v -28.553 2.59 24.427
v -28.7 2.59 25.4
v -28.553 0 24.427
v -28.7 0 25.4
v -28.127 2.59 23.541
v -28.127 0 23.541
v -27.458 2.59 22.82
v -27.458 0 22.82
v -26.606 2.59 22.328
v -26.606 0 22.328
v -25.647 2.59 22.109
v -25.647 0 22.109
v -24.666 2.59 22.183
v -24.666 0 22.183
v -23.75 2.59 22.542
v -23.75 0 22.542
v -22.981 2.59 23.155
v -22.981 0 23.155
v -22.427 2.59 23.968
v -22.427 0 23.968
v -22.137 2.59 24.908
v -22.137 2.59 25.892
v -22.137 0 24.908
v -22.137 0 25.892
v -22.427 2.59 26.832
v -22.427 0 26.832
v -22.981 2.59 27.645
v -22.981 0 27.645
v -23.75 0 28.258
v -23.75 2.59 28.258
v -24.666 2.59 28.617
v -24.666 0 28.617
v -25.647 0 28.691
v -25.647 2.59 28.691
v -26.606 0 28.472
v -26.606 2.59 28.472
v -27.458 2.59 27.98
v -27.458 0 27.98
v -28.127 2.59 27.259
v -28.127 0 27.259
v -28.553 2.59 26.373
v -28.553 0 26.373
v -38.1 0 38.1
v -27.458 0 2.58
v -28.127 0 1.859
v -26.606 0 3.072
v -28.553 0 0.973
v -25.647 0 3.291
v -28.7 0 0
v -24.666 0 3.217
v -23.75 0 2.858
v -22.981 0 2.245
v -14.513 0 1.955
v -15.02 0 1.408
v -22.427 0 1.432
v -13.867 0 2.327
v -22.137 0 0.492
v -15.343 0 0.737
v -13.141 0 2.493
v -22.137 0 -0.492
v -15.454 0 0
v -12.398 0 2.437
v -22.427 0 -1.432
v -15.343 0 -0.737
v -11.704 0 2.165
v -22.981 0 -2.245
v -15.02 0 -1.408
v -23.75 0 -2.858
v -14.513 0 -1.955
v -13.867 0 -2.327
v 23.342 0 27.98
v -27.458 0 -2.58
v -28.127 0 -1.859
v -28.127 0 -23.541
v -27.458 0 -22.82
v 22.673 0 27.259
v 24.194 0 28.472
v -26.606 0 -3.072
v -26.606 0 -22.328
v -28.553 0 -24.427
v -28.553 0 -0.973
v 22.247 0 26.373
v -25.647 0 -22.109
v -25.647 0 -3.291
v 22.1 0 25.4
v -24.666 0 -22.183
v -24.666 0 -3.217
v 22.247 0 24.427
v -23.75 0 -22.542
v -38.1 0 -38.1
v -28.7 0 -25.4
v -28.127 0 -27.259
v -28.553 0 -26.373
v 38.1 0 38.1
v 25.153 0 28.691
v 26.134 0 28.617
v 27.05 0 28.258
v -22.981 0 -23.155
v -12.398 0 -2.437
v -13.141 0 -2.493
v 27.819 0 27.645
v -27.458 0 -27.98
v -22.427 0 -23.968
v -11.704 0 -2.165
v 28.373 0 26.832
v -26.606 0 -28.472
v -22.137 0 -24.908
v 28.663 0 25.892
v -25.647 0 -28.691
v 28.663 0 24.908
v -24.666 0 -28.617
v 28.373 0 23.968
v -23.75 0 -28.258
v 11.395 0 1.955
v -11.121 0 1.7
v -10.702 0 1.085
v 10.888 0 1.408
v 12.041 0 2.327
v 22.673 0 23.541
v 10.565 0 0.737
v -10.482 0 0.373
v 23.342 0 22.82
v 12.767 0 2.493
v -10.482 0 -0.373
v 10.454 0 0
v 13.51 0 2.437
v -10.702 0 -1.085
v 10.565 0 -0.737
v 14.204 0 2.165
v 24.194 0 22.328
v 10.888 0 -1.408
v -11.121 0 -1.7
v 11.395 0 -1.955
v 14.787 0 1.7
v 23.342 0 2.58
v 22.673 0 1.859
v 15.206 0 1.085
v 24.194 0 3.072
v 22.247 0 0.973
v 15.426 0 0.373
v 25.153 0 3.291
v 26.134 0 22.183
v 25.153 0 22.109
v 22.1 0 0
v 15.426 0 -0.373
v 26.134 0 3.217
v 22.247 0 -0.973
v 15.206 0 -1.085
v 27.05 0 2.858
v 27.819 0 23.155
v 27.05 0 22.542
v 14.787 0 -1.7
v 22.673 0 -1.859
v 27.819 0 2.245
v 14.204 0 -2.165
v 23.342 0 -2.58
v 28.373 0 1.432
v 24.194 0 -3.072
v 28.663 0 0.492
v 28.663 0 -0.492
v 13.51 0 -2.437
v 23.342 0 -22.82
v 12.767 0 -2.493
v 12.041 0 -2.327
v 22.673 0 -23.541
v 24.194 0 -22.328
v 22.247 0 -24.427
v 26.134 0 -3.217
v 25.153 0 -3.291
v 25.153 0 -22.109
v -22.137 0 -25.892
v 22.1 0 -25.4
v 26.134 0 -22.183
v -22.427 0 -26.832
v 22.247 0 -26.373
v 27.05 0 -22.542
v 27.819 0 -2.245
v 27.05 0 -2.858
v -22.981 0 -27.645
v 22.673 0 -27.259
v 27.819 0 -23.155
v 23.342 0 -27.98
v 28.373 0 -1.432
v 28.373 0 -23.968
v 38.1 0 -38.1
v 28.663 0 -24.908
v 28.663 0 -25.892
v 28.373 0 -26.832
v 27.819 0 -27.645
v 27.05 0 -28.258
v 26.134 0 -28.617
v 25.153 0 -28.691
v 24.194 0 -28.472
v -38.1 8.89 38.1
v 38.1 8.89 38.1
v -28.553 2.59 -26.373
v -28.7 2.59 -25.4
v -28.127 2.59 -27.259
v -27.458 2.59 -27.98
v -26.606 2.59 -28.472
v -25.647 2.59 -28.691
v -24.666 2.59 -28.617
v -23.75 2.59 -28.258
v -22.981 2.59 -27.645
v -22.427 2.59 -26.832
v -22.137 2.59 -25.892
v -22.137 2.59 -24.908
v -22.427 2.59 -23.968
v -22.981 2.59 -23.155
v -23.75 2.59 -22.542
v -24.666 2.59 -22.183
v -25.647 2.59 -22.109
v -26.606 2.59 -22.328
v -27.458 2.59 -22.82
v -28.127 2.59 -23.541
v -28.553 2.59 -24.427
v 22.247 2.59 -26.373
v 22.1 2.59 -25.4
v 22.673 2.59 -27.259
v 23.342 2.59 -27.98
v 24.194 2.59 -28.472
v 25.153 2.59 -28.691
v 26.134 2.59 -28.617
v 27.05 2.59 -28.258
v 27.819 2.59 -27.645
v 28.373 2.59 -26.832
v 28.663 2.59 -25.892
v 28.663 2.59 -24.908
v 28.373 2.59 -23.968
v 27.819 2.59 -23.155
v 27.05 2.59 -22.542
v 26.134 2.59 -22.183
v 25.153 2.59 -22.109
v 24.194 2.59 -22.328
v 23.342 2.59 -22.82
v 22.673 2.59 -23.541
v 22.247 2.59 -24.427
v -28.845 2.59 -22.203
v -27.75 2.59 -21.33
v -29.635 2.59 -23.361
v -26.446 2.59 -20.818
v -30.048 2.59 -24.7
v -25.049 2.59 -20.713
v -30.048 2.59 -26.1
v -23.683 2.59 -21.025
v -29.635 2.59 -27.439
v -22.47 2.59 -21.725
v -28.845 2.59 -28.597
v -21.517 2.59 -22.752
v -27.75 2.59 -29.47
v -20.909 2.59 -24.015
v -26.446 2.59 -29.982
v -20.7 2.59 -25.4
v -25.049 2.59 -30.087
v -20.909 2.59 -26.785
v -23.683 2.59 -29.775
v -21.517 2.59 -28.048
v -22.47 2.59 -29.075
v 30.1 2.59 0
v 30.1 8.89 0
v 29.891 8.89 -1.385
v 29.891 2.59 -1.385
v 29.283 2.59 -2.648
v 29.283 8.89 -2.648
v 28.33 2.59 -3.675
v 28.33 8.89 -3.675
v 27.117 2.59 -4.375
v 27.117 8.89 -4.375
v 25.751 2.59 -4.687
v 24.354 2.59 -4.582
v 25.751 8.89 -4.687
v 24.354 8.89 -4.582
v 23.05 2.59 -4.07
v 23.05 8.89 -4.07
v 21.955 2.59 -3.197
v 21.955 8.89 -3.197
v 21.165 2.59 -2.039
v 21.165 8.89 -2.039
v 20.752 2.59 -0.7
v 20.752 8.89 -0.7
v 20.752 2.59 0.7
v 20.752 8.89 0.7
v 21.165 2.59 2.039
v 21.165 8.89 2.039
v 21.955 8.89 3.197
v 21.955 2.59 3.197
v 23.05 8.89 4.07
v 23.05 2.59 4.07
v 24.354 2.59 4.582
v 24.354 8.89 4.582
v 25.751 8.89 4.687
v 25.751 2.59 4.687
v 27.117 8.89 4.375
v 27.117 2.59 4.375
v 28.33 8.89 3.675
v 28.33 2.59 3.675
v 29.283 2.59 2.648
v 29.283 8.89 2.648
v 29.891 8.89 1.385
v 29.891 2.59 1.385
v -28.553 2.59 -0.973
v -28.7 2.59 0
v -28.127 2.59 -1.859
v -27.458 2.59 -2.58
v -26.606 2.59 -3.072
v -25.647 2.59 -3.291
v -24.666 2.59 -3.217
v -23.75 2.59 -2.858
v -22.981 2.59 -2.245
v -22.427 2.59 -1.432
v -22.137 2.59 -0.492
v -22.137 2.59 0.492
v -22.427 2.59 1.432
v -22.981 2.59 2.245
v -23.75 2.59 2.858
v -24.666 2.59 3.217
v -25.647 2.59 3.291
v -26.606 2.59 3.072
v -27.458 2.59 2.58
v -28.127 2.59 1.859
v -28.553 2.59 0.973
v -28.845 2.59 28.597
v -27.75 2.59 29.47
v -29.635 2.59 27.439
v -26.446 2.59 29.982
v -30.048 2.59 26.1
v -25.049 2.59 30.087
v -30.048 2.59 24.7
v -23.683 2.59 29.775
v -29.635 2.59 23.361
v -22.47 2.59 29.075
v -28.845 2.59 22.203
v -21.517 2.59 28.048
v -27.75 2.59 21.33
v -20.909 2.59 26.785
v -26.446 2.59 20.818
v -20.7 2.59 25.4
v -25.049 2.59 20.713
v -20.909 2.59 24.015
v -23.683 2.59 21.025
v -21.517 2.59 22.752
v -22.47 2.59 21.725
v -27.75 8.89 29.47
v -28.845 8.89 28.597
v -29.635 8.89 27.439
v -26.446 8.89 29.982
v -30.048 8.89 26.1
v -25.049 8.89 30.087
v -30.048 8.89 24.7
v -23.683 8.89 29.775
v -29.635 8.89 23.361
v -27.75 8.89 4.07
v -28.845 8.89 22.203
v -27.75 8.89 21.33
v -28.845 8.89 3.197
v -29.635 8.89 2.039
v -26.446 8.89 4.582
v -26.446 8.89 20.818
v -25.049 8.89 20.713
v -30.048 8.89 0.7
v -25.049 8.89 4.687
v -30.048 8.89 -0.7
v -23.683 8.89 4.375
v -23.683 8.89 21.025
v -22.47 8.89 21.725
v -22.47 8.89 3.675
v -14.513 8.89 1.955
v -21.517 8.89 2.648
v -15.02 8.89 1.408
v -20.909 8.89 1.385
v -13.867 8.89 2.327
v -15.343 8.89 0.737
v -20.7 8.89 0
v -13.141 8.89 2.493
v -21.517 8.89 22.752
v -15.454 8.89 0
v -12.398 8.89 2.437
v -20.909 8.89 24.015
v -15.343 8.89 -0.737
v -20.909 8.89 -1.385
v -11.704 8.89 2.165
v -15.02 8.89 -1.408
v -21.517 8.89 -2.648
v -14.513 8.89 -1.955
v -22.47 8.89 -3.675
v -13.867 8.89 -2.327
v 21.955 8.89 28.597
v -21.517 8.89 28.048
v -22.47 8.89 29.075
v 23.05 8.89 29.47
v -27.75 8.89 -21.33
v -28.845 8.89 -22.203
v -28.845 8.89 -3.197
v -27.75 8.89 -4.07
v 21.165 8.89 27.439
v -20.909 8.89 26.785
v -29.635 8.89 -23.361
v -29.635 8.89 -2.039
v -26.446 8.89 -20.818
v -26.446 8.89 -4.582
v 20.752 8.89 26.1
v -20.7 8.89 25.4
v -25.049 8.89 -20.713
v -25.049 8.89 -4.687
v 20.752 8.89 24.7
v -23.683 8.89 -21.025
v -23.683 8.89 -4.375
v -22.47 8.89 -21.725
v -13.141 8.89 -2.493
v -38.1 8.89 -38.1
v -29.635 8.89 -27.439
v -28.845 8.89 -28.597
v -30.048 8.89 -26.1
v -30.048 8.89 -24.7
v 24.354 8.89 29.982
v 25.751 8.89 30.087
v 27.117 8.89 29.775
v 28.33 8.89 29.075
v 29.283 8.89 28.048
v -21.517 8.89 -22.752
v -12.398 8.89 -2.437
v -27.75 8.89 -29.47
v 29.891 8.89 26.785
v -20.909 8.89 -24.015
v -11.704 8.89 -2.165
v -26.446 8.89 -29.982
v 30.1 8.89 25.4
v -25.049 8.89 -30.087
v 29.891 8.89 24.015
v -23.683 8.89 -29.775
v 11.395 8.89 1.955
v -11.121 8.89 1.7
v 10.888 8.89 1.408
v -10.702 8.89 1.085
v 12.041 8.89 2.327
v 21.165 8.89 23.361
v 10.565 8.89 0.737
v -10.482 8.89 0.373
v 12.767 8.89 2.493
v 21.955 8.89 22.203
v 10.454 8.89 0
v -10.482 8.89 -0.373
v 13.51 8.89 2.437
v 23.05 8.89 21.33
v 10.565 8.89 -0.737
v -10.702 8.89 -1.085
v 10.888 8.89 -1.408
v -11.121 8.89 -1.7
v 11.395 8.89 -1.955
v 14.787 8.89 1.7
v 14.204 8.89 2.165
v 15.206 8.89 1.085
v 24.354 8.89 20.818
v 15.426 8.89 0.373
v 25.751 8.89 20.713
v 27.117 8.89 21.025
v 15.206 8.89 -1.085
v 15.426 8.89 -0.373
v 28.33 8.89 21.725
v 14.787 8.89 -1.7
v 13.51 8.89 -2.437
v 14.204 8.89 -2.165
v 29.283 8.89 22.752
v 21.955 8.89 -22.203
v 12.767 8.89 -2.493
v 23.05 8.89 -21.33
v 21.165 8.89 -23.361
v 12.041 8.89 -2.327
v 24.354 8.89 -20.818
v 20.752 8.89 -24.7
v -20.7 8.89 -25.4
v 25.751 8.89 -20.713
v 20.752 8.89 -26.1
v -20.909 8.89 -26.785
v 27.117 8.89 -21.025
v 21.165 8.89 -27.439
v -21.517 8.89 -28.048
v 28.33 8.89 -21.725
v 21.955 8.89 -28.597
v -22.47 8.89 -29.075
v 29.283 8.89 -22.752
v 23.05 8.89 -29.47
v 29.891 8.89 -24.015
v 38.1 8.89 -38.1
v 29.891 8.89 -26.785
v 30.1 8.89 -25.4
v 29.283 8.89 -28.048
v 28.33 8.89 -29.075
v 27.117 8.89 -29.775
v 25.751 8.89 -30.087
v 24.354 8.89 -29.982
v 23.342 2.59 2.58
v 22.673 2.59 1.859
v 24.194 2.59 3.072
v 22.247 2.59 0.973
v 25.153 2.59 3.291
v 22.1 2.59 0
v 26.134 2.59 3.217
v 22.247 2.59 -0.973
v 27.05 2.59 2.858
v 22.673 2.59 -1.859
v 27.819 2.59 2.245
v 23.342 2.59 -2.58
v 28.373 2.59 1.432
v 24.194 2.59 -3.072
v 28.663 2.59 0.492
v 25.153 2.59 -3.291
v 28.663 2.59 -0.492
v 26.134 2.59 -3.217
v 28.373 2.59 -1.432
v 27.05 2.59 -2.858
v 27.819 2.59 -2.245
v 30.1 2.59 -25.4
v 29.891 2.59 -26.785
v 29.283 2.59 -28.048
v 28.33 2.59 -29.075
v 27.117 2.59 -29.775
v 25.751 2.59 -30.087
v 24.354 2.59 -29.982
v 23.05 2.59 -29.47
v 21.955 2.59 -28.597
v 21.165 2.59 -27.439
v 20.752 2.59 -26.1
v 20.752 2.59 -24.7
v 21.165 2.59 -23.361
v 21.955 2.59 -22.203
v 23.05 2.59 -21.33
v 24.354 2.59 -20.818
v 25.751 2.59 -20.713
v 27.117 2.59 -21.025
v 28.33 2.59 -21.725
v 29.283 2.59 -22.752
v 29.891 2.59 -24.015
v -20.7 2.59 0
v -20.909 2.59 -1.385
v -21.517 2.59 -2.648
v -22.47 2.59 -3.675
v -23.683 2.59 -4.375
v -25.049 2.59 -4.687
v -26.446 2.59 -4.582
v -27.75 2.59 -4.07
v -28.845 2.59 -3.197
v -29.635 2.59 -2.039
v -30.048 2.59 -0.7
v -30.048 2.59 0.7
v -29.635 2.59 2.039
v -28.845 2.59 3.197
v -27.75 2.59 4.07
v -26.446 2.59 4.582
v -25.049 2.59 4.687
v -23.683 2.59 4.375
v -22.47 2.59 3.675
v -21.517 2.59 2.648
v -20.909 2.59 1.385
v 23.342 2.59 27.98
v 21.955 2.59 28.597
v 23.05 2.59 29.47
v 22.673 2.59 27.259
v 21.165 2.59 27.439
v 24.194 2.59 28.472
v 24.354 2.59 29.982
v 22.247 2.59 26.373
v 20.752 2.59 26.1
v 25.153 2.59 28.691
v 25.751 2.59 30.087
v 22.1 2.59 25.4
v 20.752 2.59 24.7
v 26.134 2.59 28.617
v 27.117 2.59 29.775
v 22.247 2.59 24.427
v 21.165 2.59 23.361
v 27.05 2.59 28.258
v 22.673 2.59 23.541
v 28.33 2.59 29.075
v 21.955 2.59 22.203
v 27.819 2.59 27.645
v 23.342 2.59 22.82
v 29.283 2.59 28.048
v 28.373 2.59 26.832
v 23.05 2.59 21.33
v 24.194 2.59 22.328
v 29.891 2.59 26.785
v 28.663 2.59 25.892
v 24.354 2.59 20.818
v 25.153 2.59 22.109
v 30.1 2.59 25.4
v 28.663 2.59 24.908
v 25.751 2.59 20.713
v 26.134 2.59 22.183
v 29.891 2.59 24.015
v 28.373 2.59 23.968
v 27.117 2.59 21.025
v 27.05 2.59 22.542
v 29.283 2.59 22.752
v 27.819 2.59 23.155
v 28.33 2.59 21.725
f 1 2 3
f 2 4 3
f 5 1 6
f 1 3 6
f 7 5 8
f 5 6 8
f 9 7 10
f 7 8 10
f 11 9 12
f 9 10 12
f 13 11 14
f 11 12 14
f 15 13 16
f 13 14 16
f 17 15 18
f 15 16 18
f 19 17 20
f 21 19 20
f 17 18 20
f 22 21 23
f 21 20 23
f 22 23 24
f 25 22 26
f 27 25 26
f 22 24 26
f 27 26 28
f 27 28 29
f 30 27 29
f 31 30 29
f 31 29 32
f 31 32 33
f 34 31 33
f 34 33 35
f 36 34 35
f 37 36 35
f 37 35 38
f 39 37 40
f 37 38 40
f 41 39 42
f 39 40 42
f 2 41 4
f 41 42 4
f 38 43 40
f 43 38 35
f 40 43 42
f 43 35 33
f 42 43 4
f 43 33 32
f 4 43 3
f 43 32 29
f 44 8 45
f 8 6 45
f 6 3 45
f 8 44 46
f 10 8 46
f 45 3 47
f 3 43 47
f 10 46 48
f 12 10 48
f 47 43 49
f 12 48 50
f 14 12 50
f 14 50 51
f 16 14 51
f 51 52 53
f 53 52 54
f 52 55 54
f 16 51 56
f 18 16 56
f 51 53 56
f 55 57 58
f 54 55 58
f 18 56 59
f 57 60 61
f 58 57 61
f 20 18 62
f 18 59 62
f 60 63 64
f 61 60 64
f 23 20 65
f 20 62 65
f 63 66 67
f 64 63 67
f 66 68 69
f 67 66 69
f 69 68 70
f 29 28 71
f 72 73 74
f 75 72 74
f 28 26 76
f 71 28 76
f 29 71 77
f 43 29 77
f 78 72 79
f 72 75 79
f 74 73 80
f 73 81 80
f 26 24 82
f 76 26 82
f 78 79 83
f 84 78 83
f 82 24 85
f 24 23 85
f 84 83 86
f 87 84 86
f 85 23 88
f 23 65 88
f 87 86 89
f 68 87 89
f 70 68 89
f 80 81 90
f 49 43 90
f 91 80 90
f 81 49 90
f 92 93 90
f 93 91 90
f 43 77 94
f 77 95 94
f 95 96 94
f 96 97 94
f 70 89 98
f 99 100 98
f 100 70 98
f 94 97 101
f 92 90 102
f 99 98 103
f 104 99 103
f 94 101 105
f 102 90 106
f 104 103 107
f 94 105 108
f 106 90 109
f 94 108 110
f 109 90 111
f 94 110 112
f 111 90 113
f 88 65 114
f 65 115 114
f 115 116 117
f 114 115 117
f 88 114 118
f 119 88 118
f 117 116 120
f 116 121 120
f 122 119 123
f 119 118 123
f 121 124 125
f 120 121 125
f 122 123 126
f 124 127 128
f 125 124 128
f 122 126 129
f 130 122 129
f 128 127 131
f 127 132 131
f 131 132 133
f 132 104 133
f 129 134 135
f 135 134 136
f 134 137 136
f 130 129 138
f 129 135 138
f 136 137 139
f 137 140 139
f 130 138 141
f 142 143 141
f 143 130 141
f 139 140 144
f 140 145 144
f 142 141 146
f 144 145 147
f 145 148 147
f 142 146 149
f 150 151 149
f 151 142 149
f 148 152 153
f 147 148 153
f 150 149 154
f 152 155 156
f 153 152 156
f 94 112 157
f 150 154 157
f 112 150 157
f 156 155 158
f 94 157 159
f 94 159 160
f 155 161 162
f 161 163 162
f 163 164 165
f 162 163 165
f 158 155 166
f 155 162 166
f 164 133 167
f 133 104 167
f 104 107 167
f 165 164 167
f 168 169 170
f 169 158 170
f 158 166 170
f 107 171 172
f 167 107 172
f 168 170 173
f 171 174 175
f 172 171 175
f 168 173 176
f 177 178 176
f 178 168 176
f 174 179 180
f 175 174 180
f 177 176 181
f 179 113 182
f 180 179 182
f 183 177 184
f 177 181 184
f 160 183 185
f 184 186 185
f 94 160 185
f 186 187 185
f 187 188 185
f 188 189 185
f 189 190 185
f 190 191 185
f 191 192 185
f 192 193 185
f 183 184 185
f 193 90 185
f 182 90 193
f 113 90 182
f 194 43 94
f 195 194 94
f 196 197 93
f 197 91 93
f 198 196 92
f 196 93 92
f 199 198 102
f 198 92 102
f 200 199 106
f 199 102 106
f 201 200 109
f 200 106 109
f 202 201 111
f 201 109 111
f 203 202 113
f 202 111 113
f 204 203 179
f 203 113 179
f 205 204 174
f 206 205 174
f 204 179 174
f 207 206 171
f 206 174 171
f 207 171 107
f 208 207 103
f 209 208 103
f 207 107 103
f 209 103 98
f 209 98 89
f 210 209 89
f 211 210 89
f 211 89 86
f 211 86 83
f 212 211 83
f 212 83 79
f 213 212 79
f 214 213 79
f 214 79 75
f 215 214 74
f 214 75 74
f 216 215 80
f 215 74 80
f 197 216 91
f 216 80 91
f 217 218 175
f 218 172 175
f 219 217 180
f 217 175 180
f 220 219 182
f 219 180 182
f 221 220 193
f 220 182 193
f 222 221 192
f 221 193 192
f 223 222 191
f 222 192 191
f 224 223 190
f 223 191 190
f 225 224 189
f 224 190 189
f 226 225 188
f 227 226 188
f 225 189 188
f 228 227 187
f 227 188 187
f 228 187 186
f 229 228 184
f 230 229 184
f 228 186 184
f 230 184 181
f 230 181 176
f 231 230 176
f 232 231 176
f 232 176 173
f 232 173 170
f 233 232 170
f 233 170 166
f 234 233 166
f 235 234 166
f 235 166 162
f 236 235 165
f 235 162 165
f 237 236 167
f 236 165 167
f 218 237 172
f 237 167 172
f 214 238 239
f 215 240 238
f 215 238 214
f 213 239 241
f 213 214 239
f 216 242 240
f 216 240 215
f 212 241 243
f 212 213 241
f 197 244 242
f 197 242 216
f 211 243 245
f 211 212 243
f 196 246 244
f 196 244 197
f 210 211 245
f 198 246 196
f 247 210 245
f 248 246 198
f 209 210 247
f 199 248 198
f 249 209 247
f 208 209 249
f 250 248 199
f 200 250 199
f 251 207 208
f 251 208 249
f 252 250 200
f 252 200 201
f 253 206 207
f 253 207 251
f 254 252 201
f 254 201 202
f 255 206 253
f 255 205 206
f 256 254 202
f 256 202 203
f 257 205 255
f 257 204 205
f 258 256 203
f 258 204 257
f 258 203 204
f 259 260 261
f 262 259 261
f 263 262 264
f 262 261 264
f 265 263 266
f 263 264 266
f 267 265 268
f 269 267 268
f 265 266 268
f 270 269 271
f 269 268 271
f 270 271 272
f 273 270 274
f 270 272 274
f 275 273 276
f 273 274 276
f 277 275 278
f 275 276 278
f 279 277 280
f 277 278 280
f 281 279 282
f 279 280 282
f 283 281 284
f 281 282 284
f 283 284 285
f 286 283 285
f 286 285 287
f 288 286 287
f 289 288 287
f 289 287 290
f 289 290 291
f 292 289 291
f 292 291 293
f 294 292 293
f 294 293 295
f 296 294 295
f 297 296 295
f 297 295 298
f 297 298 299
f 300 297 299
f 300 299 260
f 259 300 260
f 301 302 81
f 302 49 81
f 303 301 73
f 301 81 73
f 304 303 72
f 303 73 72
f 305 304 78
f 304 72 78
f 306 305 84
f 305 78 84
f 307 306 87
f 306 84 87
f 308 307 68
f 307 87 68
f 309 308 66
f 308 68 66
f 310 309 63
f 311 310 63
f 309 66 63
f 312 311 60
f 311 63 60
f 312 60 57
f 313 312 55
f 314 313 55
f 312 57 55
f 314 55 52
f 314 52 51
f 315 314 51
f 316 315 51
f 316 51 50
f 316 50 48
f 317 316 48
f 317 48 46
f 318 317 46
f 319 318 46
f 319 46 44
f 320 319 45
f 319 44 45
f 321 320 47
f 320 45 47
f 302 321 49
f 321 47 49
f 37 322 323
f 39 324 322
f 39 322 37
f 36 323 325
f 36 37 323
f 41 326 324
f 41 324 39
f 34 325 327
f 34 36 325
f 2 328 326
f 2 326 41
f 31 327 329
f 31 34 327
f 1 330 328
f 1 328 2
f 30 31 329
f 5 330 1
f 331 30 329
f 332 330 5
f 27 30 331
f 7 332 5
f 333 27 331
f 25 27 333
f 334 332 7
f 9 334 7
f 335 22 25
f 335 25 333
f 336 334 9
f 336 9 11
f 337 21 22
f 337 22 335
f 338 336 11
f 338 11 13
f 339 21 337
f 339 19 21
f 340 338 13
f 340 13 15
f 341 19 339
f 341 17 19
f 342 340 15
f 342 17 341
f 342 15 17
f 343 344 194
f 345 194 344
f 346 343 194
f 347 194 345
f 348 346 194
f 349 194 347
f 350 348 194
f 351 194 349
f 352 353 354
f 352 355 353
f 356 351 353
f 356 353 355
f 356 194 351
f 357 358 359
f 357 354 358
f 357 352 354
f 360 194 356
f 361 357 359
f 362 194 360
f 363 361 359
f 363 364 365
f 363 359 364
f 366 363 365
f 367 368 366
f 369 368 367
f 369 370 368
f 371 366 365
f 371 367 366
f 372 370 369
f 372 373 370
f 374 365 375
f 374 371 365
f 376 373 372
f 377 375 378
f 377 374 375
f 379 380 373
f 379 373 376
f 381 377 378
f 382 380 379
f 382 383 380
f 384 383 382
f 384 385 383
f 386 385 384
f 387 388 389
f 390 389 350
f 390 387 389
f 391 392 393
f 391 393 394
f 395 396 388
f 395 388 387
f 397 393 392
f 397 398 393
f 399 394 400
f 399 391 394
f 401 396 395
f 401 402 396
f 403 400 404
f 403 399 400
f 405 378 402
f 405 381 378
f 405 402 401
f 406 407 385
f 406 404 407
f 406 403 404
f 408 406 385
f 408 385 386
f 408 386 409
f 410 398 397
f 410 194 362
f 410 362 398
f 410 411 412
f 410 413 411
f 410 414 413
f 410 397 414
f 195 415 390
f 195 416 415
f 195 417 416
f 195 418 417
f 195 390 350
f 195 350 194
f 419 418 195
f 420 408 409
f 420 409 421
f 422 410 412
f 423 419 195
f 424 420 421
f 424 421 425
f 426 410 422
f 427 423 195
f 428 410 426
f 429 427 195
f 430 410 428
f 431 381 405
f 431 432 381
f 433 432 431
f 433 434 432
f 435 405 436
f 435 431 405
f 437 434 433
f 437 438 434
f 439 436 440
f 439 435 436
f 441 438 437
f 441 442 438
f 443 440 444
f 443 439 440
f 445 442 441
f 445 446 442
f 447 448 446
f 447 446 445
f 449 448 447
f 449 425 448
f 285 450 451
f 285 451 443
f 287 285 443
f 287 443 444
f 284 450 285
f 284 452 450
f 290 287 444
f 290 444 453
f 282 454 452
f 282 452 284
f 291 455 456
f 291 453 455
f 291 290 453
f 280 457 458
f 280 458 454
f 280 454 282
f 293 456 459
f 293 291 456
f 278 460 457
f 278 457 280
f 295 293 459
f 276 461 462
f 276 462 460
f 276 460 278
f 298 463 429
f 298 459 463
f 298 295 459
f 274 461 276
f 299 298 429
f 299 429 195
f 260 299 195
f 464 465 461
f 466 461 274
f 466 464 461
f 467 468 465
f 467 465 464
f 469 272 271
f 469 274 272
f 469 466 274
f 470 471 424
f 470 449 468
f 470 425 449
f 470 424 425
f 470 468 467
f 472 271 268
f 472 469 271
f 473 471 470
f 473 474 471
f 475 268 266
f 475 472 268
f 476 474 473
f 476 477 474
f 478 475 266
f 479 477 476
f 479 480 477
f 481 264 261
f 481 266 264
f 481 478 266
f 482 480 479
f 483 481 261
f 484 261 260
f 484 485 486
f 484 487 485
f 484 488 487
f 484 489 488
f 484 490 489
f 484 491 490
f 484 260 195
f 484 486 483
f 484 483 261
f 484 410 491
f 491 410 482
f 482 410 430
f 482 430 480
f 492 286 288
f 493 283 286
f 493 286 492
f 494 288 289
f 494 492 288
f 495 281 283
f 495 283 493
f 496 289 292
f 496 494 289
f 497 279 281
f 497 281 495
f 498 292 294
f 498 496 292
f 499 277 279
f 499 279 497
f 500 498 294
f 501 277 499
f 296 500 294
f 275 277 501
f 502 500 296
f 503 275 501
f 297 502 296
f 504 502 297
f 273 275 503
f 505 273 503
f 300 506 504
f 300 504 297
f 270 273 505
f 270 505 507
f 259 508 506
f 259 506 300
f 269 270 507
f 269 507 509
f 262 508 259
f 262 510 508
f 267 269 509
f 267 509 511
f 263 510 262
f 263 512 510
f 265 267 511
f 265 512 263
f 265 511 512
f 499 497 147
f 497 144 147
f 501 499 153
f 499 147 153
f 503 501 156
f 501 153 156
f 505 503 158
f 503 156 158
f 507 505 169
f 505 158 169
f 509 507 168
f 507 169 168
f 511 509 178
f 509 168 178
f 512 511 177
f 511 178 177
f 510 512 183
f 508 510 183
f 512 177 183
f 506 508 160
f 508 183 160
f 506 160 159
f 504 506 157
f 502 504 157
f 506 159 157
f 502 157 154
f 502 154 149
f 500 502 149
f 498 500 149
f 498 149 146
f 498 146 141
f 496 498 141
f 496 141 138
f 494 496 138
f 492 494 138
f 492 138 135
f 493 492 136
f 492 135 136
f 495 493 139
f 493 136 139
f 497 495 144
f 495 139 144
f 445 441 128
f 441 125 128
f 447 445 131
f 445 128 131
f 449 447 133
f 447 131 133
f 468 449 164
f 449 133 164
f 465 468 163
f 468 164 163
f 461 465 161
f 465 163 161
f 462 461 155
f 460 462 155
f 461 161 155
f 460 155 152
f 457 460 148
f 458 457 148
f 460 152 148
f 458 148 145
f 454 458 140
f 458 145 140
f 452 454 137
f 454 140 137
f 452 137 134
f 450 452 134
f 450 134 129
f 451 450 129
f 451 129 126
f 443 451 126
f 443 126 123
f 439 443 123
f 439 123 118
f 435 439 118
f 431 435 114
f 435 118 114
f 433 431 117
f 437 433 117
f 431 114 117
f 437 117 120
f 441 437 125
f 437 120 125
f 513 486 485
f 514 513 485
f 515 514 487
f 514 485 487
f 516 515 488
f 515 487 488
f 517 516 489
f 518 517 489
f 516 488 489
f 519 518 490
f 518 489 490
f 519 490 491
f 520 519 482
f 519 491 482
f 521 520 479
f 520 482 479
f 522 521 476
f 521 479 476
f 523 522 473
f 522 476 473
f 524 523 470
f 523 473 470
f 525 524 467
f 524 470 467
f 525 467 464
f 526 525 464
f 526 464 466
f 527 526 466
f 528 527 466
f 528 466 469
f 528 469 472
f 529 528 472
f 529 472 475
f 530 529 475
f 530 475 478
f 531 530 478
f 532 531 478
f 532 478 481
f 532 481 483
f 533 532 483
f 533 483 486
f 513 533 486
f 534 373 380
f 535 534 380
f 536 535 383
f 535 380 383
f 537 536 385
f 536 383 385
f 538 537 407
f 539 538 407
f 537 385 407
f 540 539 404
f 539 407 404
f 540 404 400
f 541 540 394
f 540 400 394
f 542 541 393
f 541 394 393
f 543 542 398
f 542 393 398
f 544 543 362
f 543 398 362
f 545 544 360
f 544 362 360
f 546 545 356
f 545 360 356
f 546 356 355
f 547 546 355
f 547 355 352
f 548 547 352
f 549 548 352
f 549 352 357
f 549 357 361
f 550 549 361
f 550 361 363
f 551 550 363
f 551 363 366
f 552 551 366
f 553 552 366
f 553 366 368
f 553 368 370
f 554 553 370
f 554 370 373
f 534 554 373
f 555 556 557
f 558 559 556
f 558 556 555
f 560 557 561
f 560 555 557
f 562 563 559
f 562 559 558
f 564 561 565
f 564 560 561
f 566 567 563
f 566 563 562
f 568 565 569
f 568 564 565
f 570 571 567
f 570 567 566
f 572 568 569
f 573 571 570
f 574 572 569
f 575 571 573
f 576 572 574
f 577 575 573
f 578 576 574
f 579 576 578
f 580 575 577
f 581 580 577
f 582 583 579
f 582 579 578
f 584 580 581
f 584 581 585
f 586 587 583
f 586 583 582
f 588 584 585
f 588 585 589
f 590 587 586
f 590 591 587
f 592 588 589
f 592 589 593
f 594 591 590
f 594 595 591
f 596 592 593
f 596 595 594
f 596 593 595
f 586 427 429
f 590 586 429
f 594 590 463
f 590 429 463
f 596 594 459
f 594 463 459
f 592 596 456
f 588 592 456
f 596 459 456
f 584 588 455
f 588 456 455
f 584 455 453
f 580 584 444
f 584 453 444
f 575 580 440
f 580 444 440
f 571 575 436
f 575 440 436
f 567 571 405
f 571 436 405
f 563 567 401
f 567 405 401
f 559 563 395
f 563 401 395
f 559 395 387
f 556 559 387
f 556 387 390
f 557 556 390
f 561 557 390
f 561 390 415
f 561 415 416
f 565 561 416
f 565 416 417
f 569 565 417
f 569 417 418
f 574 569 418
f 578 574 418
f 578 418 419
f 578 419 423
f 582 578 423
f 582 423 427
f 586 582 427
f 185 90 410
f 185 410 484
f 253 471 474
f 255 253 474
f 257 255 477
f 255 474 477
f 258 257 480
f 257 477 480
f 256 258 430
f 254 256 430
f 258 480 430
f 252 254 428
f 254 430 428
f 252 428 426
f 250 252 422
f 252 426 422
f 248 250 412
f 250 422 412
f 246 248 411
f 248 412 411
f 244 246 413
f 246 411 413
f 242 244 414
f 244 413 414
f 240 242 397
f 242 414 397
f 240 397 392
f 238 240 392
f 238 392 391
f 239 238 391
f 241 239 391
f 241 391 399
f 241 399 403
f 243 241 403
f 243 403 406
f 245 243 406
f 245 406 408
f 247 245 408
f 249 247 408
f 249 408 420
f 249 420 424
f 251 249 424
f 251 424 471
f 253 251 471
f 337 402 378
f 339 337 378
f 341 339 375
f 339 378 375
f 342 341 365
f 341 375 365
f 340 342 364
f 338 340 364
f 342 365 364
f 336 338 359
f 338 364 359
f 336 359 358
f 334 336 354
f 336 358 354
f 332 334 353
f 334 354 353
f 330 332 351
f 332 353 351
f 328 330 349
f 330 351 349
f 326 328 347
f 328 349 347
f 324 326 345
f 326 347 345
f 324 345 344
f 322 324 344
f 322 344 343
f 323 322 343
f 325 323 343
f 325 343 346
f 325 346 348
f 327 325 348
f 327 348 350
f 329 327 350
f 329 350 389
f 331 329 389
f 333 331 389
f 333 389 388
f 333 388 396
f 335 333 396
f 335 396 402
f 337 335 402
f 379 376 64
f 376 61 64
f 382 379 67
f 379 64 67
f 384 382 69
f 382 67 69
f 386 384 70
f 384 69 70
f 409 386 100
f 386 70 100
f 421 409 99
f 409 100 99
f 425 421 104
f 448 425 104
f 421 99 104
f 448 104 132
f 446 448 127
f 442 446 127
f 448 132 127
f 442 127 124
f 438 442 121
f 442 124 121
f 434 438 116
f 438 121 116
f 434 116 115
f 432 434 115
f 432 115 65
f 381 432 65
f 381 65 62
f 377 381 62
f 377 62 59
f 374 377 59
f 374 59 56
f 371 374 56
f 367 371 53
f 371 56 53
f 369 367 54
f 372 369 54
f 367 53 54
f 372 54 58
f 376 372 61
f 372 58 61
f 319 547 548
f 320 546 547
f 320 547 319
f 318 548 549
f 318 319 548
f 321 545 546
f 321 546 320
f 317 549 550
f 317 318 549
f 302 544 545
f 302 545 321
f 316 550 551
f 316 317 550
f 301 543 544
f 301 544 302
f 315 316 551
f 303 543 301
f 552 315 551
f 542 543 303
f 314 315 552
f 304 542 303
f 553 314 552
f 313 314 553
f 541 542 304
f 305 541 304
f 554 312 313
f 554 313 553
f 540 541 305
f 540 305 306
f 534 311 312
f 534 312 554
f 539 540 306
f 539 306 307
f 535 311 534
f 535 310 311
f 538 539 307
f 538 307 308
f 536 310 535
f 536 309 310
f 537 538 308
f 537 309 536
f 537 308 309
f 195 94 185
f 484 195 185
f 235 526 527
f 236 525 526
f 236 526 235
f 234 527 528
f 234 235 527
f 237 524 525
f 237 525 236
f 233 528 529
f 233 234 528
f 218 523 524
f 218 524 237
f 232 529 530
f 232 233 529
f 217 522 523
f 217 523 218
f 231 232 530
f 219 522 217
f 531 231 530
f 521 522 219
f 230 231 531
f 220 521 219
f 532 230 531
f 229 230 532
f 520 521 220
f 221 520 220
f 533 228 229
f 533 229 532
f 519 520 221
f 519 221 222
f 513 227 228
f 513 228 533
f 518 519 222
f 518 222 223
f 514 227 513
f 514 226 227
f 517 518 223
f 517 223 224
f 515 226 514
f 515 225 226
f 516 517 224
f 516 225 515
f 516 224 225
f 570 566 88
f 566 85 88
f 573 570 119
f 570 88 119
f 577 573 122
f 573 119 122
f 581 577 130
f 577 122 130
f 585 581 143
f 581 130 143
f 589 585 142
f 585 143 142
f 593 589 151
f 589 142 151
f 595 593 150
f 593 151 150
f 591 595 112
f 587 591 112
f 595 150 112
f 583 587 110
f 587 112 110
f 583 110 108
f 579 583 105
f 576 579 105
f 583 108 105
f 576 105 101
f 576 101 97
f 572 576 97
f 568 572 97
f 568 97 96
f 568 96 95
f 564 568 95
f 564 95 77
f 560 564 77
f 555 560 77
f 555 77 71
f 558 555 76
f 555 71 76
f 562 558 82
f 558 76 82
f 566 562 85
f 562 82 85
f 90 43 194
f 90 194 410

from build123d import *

# Parameters (mm, degrees)
SKETCH1_W                       = 76.2
SKETCH1_H                       = 76.2
BOSS_EXTRUDE1_DEPTH             = 8.89
TAP_DRILL_FOR_M6X1_0_TAP1_D     = 5
TAP_DRILL_FOR_M6X1_0_TAP1_DEPTH = 8.89
TAP_DRILL_FOR_M6X1_0_TAP1_TIP   = 1.502151548
CBORE_FOR_M6_SHCS1_D            = 6.6
CBORE_FOR_M6_SHCS1_DEPTH        = 8.89
CBORE_FOR_M6_SHCS1_CBORE_D      = 9.4
CBORE_FOR_M6_SHCS1_CBORE_DEPTH  = 6.3
CBORE_FOR_M6_SHCS1_TIP          = 1.982840043


with BuildPart() as part:
    # Sketch1 → Boss-Extrude1 (new body)
    with BuildSketch(Plane(origin=(0, 0, 0), x_dir=(1, 0, 0), z_dir=(0, 1, 0))):
        Rectangle(SKETCH1_W, SKETCH1_H)
    extrude(amount=BOSS_EXTRUDE1_DEPTH)

    # Tap Drill for M6x1.0 Tap1
    with Locations(Plane(origin=(0, 8.89, 0), x_dir=(1, 0, 0), z_dir=(0, 1, 0))):
        with Locations((-12.954, 0), (12.954, 0)):
            Hole(TAP_DRILL_FOR_M6X1_0_TAP1_D / 2, depth=TAP_DRILL_FOR_M6X1_0_TAP1_DEPTH)
            with Locations((0, 0, -(TAP_DRILL_FOR_M6X1_0_TAP1_DEPTH + TAP_DRILL_FOR_M6X1_0_TAP1_TIP / 2))):  # 118° drill point
                Cone(0, TAP_DRILL_FOR_M6X1_0_TAP1_D / 2, TAP_DRILL_FOR_M6X1_0_TAP1_TIP, mode=Mode.SUBTRACT)

    # CBORE for M6 SHCS1
    with Locations(Plane(origin=(0, 8.89, 0), x_dir=(1, 0, 0), z_dir=(0, 1, 0))):
        with Locations((-25.4, 25.4), (25.4, 25.4), (25.4, -25.4), (-25.4, -25.4), (-25.4, 0), (25.4, 0)):
            CounterBoreHole(CBORE_FOR_M6_SHCS1_D / 2, CBORE_FOR_M6_SHCS1_CBORE_D / 2, CBORE_FOR_M6_SHCS1_CBORE_DEPTH, depth=CBORE_FOR_M6_SHCS1_DEPTH)
            with Locations((0, 0, -(CBORE_FOR_M6_SHCS1_DEPTH + CBORE_FOR_M6_SHCS1_TIP / 2))):  # 118° drill point
                Cone(0, CBORE_FOR_M6_SHCS1_D / 2, CBORE_FOR_M6_SHCS1_TIP, mode=Mode.SUBTRACT)


solid = part.part
